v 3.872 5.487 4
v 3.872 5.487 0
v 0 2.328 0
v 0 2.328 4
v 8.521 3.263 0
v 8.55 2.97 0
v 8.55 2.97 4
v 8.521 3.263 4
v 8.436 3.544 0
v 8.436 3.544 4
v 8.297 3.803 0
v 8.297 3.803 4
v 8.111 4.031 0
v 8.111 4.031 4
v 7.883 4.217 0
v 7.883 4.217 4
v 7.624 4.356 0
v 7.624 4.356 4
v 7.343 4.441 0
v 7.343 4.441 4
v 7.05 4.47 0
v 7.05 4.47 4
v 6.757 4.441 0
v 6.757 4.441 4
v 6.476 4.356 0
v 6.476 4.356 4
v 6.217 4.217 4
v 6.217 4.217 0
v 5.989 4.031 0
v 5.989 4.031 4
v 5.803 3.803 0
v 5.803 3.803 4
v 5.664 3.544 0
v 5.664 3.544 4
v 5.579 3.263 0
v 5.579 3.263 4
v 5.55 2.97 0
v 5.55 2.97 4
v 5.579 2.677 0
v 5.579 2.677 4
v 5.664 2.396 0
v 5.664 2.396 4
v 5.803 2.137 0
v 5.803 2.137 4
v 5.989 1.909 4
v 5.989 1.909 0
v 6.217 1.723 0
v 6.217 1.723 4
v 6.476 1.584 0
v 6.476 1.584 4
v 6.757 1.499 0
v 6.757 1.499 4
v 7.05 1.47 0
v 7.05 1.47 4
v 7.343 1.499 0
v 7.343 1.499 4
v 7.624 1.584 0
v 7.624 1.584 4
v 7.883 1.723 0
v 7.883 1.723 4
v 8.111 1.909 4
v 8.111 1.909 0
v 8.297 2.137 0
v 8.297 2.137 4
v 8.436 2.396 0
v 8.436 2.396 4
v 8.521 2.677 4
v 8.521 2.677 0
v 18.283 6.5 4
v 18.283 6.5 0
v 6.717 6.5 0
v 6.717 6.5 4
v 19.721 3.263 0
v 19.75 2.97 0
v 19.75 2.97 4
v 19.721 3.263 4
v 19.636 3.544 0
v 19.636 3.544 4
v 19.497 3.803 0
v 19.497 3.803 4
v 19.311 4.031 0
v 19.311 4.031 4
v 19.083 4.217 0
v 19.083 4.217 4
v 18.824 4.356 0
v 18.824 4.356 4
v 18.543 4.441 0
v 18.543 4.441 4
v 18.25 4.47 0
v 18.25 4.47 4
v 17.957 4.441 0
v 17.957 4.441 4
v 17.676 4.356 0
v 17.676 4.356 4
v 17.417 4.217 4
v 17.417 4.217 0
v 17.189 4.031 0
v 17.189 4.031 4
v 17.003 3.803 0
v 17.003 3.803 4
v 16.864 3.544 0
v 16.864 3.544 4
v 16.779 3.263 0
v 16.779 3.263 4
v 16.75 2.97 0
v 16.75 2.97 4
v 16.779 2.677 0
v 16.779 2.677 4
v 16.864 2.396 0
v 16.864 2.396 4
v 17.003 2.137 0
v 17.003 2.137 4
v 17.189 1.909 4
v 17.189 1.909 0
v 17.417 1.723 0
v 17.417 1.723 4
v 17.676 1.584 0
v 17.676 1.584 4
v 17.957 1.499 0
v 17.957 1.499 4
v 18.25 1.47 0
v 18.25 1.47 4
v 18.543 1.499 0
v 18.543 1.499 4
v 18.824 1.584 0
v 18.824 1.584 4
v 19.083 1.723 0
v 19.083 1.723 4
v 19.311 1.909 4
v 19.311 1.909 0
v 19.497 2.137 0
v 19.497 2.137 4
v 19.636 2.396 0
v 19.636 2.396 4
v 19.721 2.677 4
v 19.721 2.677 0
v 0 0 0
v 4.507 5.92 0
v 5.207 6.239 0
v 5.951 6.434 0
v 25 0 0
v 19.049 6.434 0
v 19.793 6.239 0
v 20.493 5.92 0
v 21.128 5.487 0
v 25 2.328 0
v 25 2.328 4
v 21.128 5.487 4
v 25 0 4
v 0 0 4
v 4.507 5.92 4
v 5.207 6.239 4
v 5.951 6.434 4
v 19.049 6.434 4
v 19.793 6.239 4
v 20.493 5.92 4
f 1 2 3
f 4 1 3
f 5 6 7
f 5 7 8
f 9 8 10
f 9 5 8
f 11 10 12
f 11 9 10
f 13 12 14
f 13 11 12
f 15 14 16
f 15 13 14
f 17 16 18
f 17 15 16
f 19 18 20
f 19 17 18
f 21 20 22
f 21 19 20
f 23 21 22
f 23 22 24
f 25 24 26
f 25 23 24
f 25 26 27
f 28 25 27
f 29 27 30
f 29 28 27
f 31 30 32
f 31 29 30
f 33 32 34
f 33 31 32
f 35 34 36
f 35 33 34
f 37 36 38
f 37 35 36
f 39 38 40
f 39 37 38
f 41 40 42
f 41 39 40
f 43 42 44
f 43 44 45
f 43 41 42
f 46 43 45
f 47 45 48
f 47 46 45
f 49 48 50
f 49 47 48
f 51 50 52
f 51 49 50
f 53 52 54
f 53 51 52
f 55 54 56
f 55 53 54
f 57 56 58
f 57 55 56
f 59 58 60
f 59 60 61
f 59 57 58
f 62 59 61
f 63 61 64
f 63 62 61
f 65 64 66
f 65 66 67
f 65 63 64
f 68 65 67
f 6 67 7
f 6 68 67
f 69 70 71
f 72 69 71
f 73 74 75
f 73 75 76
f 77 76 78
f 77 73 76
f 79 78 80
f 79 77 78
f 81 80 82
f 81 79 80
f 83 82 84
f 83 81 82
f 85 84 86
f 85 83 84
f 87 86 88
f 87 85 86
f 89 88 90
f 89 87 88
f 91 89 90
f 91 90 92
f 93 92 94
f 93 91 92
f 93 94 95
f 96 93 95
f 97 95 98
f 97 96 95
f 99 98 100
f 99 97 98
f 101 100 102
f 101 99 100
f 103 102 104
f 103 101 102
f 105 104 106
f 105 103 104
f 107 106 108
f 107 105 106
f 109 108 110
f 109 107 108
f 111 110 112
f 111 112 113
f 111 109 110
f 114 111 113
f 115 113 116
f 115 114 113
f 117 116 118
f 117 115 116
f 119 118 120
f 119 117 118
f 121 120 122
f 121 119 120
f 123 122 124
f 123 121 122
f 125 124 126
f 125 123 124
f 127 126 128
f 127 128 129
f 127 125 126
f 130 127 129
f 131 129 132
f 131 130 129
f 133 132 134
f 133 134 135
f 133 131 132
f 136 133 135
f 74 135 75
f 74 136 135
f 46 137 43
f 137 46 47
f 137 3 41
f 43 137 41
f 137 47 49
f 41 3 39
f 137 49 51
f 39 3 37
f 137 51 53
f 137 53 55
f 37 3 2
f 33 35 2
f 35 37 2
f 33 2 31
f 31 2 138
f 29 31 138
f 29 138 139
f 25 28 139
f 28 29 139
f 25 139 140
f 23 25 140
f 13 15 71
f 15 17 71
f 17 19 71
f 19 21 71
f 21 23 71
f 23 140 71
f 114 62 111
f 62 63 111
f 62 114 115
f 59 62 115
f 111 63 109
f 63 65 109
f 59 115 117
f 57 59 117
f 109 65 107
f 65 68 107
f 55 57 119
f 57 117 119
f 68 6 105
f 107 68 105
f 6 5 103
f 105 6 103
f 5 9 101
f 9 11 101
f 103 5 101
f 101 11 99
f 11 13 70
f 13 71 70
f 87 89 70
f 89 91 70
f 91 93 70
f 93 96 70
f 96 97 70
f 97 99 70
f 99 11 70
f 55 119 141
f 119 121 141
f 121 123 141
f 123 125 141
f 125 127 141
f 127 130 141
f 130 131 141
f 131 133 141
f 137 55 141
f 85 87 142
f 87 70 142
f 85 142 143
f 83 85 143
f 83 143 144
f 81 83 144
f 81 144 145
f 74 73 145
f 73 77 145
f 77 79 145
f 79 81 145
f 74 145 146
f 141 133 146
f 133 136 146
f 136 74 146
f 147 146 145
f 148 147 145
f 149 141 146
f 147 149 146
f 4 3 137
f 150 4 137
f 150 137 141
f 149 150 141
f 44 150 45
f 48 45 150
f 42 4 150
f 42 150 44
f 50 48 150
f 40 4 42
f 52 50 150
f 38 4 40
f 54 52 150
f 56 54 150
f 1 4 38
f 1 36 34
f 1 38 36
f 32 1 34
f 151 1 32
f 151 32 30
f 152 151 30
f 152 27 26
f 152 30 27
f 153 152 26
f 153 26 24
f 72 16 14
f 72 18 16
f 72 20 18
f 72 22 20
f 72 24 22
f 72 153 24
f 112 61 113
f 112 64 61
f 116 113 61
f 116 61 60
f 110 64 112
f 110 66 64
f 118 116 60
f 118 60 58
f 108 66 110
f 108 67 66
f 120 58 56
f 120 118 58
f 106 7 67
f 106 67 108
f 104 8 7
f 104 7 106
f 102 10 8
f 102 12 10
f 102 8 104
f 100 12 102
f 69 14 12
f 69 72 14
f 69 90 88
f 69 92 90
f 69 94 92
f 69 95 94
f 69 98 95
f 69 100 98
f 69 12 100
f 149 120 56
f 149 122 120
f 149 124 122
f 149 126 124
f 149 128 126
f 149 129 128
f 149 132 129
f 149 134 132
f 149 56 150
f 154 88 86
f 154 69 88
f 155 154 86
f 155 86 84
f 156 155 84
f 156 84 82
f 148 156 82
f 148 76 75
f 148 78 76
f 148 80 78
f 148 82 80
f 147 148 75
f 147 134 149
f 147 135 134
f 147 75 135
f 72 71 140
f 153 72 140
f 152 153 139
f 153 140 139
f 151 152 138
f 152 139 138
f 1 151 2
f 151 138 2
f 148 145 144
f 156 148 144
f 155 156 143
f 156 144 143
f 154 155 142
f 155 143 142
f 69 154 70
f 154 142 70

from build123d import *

# Parameters (mm, degrees)
SKETCH1_R           = 1.5
BOSS_EXTRUDE1_DEPTH = 4


with BuildPart() as part:
    # Sketch1 → Boss-Extrude1 (new body)
    with BuildSketch(Plane.XY):
        with BuildLine():
            Line((18.283368275, 6.499999319), (6.716637678, 6.499999319))
            ThreePointArc((6.716637678, 6.499999319), (5.206858361, 6.239169805), (3.872099046, 5.486917725))
            Line((3.872099046, 5.486917725), (2.976e-06, 2.328161032))
            Line((2.976e-06, 2.328161032), (2.976e-06, -6.81e-07))
            Line((2.976e-06, -6.81e-07), (25.000002976, -6.81e-07))
            Line((25.000002976, -6.81e-07), (25.000002976, 2.328161032))
            Line((25.000002976, 2.328161032), (21.127906906, 5.486917725))
            ThreePointArc((21.127906906, 5.486917725), (19.793147591, 6.239169805), (18.283368275, 6.499999319))
        make_face()
        with Locations((7.050002976, 2.969999319)):
            Circle(SKETCH1_R, mode=Mode.SUBTRACT)
        with Locations((18.250002976, 2.969999319)):
            Circle(SKETCH1_R, mode=Mode.SUBTRACT)
    extrude(amount=BOSS_EXTRUDE1_DEPTH)


solid = part.part
